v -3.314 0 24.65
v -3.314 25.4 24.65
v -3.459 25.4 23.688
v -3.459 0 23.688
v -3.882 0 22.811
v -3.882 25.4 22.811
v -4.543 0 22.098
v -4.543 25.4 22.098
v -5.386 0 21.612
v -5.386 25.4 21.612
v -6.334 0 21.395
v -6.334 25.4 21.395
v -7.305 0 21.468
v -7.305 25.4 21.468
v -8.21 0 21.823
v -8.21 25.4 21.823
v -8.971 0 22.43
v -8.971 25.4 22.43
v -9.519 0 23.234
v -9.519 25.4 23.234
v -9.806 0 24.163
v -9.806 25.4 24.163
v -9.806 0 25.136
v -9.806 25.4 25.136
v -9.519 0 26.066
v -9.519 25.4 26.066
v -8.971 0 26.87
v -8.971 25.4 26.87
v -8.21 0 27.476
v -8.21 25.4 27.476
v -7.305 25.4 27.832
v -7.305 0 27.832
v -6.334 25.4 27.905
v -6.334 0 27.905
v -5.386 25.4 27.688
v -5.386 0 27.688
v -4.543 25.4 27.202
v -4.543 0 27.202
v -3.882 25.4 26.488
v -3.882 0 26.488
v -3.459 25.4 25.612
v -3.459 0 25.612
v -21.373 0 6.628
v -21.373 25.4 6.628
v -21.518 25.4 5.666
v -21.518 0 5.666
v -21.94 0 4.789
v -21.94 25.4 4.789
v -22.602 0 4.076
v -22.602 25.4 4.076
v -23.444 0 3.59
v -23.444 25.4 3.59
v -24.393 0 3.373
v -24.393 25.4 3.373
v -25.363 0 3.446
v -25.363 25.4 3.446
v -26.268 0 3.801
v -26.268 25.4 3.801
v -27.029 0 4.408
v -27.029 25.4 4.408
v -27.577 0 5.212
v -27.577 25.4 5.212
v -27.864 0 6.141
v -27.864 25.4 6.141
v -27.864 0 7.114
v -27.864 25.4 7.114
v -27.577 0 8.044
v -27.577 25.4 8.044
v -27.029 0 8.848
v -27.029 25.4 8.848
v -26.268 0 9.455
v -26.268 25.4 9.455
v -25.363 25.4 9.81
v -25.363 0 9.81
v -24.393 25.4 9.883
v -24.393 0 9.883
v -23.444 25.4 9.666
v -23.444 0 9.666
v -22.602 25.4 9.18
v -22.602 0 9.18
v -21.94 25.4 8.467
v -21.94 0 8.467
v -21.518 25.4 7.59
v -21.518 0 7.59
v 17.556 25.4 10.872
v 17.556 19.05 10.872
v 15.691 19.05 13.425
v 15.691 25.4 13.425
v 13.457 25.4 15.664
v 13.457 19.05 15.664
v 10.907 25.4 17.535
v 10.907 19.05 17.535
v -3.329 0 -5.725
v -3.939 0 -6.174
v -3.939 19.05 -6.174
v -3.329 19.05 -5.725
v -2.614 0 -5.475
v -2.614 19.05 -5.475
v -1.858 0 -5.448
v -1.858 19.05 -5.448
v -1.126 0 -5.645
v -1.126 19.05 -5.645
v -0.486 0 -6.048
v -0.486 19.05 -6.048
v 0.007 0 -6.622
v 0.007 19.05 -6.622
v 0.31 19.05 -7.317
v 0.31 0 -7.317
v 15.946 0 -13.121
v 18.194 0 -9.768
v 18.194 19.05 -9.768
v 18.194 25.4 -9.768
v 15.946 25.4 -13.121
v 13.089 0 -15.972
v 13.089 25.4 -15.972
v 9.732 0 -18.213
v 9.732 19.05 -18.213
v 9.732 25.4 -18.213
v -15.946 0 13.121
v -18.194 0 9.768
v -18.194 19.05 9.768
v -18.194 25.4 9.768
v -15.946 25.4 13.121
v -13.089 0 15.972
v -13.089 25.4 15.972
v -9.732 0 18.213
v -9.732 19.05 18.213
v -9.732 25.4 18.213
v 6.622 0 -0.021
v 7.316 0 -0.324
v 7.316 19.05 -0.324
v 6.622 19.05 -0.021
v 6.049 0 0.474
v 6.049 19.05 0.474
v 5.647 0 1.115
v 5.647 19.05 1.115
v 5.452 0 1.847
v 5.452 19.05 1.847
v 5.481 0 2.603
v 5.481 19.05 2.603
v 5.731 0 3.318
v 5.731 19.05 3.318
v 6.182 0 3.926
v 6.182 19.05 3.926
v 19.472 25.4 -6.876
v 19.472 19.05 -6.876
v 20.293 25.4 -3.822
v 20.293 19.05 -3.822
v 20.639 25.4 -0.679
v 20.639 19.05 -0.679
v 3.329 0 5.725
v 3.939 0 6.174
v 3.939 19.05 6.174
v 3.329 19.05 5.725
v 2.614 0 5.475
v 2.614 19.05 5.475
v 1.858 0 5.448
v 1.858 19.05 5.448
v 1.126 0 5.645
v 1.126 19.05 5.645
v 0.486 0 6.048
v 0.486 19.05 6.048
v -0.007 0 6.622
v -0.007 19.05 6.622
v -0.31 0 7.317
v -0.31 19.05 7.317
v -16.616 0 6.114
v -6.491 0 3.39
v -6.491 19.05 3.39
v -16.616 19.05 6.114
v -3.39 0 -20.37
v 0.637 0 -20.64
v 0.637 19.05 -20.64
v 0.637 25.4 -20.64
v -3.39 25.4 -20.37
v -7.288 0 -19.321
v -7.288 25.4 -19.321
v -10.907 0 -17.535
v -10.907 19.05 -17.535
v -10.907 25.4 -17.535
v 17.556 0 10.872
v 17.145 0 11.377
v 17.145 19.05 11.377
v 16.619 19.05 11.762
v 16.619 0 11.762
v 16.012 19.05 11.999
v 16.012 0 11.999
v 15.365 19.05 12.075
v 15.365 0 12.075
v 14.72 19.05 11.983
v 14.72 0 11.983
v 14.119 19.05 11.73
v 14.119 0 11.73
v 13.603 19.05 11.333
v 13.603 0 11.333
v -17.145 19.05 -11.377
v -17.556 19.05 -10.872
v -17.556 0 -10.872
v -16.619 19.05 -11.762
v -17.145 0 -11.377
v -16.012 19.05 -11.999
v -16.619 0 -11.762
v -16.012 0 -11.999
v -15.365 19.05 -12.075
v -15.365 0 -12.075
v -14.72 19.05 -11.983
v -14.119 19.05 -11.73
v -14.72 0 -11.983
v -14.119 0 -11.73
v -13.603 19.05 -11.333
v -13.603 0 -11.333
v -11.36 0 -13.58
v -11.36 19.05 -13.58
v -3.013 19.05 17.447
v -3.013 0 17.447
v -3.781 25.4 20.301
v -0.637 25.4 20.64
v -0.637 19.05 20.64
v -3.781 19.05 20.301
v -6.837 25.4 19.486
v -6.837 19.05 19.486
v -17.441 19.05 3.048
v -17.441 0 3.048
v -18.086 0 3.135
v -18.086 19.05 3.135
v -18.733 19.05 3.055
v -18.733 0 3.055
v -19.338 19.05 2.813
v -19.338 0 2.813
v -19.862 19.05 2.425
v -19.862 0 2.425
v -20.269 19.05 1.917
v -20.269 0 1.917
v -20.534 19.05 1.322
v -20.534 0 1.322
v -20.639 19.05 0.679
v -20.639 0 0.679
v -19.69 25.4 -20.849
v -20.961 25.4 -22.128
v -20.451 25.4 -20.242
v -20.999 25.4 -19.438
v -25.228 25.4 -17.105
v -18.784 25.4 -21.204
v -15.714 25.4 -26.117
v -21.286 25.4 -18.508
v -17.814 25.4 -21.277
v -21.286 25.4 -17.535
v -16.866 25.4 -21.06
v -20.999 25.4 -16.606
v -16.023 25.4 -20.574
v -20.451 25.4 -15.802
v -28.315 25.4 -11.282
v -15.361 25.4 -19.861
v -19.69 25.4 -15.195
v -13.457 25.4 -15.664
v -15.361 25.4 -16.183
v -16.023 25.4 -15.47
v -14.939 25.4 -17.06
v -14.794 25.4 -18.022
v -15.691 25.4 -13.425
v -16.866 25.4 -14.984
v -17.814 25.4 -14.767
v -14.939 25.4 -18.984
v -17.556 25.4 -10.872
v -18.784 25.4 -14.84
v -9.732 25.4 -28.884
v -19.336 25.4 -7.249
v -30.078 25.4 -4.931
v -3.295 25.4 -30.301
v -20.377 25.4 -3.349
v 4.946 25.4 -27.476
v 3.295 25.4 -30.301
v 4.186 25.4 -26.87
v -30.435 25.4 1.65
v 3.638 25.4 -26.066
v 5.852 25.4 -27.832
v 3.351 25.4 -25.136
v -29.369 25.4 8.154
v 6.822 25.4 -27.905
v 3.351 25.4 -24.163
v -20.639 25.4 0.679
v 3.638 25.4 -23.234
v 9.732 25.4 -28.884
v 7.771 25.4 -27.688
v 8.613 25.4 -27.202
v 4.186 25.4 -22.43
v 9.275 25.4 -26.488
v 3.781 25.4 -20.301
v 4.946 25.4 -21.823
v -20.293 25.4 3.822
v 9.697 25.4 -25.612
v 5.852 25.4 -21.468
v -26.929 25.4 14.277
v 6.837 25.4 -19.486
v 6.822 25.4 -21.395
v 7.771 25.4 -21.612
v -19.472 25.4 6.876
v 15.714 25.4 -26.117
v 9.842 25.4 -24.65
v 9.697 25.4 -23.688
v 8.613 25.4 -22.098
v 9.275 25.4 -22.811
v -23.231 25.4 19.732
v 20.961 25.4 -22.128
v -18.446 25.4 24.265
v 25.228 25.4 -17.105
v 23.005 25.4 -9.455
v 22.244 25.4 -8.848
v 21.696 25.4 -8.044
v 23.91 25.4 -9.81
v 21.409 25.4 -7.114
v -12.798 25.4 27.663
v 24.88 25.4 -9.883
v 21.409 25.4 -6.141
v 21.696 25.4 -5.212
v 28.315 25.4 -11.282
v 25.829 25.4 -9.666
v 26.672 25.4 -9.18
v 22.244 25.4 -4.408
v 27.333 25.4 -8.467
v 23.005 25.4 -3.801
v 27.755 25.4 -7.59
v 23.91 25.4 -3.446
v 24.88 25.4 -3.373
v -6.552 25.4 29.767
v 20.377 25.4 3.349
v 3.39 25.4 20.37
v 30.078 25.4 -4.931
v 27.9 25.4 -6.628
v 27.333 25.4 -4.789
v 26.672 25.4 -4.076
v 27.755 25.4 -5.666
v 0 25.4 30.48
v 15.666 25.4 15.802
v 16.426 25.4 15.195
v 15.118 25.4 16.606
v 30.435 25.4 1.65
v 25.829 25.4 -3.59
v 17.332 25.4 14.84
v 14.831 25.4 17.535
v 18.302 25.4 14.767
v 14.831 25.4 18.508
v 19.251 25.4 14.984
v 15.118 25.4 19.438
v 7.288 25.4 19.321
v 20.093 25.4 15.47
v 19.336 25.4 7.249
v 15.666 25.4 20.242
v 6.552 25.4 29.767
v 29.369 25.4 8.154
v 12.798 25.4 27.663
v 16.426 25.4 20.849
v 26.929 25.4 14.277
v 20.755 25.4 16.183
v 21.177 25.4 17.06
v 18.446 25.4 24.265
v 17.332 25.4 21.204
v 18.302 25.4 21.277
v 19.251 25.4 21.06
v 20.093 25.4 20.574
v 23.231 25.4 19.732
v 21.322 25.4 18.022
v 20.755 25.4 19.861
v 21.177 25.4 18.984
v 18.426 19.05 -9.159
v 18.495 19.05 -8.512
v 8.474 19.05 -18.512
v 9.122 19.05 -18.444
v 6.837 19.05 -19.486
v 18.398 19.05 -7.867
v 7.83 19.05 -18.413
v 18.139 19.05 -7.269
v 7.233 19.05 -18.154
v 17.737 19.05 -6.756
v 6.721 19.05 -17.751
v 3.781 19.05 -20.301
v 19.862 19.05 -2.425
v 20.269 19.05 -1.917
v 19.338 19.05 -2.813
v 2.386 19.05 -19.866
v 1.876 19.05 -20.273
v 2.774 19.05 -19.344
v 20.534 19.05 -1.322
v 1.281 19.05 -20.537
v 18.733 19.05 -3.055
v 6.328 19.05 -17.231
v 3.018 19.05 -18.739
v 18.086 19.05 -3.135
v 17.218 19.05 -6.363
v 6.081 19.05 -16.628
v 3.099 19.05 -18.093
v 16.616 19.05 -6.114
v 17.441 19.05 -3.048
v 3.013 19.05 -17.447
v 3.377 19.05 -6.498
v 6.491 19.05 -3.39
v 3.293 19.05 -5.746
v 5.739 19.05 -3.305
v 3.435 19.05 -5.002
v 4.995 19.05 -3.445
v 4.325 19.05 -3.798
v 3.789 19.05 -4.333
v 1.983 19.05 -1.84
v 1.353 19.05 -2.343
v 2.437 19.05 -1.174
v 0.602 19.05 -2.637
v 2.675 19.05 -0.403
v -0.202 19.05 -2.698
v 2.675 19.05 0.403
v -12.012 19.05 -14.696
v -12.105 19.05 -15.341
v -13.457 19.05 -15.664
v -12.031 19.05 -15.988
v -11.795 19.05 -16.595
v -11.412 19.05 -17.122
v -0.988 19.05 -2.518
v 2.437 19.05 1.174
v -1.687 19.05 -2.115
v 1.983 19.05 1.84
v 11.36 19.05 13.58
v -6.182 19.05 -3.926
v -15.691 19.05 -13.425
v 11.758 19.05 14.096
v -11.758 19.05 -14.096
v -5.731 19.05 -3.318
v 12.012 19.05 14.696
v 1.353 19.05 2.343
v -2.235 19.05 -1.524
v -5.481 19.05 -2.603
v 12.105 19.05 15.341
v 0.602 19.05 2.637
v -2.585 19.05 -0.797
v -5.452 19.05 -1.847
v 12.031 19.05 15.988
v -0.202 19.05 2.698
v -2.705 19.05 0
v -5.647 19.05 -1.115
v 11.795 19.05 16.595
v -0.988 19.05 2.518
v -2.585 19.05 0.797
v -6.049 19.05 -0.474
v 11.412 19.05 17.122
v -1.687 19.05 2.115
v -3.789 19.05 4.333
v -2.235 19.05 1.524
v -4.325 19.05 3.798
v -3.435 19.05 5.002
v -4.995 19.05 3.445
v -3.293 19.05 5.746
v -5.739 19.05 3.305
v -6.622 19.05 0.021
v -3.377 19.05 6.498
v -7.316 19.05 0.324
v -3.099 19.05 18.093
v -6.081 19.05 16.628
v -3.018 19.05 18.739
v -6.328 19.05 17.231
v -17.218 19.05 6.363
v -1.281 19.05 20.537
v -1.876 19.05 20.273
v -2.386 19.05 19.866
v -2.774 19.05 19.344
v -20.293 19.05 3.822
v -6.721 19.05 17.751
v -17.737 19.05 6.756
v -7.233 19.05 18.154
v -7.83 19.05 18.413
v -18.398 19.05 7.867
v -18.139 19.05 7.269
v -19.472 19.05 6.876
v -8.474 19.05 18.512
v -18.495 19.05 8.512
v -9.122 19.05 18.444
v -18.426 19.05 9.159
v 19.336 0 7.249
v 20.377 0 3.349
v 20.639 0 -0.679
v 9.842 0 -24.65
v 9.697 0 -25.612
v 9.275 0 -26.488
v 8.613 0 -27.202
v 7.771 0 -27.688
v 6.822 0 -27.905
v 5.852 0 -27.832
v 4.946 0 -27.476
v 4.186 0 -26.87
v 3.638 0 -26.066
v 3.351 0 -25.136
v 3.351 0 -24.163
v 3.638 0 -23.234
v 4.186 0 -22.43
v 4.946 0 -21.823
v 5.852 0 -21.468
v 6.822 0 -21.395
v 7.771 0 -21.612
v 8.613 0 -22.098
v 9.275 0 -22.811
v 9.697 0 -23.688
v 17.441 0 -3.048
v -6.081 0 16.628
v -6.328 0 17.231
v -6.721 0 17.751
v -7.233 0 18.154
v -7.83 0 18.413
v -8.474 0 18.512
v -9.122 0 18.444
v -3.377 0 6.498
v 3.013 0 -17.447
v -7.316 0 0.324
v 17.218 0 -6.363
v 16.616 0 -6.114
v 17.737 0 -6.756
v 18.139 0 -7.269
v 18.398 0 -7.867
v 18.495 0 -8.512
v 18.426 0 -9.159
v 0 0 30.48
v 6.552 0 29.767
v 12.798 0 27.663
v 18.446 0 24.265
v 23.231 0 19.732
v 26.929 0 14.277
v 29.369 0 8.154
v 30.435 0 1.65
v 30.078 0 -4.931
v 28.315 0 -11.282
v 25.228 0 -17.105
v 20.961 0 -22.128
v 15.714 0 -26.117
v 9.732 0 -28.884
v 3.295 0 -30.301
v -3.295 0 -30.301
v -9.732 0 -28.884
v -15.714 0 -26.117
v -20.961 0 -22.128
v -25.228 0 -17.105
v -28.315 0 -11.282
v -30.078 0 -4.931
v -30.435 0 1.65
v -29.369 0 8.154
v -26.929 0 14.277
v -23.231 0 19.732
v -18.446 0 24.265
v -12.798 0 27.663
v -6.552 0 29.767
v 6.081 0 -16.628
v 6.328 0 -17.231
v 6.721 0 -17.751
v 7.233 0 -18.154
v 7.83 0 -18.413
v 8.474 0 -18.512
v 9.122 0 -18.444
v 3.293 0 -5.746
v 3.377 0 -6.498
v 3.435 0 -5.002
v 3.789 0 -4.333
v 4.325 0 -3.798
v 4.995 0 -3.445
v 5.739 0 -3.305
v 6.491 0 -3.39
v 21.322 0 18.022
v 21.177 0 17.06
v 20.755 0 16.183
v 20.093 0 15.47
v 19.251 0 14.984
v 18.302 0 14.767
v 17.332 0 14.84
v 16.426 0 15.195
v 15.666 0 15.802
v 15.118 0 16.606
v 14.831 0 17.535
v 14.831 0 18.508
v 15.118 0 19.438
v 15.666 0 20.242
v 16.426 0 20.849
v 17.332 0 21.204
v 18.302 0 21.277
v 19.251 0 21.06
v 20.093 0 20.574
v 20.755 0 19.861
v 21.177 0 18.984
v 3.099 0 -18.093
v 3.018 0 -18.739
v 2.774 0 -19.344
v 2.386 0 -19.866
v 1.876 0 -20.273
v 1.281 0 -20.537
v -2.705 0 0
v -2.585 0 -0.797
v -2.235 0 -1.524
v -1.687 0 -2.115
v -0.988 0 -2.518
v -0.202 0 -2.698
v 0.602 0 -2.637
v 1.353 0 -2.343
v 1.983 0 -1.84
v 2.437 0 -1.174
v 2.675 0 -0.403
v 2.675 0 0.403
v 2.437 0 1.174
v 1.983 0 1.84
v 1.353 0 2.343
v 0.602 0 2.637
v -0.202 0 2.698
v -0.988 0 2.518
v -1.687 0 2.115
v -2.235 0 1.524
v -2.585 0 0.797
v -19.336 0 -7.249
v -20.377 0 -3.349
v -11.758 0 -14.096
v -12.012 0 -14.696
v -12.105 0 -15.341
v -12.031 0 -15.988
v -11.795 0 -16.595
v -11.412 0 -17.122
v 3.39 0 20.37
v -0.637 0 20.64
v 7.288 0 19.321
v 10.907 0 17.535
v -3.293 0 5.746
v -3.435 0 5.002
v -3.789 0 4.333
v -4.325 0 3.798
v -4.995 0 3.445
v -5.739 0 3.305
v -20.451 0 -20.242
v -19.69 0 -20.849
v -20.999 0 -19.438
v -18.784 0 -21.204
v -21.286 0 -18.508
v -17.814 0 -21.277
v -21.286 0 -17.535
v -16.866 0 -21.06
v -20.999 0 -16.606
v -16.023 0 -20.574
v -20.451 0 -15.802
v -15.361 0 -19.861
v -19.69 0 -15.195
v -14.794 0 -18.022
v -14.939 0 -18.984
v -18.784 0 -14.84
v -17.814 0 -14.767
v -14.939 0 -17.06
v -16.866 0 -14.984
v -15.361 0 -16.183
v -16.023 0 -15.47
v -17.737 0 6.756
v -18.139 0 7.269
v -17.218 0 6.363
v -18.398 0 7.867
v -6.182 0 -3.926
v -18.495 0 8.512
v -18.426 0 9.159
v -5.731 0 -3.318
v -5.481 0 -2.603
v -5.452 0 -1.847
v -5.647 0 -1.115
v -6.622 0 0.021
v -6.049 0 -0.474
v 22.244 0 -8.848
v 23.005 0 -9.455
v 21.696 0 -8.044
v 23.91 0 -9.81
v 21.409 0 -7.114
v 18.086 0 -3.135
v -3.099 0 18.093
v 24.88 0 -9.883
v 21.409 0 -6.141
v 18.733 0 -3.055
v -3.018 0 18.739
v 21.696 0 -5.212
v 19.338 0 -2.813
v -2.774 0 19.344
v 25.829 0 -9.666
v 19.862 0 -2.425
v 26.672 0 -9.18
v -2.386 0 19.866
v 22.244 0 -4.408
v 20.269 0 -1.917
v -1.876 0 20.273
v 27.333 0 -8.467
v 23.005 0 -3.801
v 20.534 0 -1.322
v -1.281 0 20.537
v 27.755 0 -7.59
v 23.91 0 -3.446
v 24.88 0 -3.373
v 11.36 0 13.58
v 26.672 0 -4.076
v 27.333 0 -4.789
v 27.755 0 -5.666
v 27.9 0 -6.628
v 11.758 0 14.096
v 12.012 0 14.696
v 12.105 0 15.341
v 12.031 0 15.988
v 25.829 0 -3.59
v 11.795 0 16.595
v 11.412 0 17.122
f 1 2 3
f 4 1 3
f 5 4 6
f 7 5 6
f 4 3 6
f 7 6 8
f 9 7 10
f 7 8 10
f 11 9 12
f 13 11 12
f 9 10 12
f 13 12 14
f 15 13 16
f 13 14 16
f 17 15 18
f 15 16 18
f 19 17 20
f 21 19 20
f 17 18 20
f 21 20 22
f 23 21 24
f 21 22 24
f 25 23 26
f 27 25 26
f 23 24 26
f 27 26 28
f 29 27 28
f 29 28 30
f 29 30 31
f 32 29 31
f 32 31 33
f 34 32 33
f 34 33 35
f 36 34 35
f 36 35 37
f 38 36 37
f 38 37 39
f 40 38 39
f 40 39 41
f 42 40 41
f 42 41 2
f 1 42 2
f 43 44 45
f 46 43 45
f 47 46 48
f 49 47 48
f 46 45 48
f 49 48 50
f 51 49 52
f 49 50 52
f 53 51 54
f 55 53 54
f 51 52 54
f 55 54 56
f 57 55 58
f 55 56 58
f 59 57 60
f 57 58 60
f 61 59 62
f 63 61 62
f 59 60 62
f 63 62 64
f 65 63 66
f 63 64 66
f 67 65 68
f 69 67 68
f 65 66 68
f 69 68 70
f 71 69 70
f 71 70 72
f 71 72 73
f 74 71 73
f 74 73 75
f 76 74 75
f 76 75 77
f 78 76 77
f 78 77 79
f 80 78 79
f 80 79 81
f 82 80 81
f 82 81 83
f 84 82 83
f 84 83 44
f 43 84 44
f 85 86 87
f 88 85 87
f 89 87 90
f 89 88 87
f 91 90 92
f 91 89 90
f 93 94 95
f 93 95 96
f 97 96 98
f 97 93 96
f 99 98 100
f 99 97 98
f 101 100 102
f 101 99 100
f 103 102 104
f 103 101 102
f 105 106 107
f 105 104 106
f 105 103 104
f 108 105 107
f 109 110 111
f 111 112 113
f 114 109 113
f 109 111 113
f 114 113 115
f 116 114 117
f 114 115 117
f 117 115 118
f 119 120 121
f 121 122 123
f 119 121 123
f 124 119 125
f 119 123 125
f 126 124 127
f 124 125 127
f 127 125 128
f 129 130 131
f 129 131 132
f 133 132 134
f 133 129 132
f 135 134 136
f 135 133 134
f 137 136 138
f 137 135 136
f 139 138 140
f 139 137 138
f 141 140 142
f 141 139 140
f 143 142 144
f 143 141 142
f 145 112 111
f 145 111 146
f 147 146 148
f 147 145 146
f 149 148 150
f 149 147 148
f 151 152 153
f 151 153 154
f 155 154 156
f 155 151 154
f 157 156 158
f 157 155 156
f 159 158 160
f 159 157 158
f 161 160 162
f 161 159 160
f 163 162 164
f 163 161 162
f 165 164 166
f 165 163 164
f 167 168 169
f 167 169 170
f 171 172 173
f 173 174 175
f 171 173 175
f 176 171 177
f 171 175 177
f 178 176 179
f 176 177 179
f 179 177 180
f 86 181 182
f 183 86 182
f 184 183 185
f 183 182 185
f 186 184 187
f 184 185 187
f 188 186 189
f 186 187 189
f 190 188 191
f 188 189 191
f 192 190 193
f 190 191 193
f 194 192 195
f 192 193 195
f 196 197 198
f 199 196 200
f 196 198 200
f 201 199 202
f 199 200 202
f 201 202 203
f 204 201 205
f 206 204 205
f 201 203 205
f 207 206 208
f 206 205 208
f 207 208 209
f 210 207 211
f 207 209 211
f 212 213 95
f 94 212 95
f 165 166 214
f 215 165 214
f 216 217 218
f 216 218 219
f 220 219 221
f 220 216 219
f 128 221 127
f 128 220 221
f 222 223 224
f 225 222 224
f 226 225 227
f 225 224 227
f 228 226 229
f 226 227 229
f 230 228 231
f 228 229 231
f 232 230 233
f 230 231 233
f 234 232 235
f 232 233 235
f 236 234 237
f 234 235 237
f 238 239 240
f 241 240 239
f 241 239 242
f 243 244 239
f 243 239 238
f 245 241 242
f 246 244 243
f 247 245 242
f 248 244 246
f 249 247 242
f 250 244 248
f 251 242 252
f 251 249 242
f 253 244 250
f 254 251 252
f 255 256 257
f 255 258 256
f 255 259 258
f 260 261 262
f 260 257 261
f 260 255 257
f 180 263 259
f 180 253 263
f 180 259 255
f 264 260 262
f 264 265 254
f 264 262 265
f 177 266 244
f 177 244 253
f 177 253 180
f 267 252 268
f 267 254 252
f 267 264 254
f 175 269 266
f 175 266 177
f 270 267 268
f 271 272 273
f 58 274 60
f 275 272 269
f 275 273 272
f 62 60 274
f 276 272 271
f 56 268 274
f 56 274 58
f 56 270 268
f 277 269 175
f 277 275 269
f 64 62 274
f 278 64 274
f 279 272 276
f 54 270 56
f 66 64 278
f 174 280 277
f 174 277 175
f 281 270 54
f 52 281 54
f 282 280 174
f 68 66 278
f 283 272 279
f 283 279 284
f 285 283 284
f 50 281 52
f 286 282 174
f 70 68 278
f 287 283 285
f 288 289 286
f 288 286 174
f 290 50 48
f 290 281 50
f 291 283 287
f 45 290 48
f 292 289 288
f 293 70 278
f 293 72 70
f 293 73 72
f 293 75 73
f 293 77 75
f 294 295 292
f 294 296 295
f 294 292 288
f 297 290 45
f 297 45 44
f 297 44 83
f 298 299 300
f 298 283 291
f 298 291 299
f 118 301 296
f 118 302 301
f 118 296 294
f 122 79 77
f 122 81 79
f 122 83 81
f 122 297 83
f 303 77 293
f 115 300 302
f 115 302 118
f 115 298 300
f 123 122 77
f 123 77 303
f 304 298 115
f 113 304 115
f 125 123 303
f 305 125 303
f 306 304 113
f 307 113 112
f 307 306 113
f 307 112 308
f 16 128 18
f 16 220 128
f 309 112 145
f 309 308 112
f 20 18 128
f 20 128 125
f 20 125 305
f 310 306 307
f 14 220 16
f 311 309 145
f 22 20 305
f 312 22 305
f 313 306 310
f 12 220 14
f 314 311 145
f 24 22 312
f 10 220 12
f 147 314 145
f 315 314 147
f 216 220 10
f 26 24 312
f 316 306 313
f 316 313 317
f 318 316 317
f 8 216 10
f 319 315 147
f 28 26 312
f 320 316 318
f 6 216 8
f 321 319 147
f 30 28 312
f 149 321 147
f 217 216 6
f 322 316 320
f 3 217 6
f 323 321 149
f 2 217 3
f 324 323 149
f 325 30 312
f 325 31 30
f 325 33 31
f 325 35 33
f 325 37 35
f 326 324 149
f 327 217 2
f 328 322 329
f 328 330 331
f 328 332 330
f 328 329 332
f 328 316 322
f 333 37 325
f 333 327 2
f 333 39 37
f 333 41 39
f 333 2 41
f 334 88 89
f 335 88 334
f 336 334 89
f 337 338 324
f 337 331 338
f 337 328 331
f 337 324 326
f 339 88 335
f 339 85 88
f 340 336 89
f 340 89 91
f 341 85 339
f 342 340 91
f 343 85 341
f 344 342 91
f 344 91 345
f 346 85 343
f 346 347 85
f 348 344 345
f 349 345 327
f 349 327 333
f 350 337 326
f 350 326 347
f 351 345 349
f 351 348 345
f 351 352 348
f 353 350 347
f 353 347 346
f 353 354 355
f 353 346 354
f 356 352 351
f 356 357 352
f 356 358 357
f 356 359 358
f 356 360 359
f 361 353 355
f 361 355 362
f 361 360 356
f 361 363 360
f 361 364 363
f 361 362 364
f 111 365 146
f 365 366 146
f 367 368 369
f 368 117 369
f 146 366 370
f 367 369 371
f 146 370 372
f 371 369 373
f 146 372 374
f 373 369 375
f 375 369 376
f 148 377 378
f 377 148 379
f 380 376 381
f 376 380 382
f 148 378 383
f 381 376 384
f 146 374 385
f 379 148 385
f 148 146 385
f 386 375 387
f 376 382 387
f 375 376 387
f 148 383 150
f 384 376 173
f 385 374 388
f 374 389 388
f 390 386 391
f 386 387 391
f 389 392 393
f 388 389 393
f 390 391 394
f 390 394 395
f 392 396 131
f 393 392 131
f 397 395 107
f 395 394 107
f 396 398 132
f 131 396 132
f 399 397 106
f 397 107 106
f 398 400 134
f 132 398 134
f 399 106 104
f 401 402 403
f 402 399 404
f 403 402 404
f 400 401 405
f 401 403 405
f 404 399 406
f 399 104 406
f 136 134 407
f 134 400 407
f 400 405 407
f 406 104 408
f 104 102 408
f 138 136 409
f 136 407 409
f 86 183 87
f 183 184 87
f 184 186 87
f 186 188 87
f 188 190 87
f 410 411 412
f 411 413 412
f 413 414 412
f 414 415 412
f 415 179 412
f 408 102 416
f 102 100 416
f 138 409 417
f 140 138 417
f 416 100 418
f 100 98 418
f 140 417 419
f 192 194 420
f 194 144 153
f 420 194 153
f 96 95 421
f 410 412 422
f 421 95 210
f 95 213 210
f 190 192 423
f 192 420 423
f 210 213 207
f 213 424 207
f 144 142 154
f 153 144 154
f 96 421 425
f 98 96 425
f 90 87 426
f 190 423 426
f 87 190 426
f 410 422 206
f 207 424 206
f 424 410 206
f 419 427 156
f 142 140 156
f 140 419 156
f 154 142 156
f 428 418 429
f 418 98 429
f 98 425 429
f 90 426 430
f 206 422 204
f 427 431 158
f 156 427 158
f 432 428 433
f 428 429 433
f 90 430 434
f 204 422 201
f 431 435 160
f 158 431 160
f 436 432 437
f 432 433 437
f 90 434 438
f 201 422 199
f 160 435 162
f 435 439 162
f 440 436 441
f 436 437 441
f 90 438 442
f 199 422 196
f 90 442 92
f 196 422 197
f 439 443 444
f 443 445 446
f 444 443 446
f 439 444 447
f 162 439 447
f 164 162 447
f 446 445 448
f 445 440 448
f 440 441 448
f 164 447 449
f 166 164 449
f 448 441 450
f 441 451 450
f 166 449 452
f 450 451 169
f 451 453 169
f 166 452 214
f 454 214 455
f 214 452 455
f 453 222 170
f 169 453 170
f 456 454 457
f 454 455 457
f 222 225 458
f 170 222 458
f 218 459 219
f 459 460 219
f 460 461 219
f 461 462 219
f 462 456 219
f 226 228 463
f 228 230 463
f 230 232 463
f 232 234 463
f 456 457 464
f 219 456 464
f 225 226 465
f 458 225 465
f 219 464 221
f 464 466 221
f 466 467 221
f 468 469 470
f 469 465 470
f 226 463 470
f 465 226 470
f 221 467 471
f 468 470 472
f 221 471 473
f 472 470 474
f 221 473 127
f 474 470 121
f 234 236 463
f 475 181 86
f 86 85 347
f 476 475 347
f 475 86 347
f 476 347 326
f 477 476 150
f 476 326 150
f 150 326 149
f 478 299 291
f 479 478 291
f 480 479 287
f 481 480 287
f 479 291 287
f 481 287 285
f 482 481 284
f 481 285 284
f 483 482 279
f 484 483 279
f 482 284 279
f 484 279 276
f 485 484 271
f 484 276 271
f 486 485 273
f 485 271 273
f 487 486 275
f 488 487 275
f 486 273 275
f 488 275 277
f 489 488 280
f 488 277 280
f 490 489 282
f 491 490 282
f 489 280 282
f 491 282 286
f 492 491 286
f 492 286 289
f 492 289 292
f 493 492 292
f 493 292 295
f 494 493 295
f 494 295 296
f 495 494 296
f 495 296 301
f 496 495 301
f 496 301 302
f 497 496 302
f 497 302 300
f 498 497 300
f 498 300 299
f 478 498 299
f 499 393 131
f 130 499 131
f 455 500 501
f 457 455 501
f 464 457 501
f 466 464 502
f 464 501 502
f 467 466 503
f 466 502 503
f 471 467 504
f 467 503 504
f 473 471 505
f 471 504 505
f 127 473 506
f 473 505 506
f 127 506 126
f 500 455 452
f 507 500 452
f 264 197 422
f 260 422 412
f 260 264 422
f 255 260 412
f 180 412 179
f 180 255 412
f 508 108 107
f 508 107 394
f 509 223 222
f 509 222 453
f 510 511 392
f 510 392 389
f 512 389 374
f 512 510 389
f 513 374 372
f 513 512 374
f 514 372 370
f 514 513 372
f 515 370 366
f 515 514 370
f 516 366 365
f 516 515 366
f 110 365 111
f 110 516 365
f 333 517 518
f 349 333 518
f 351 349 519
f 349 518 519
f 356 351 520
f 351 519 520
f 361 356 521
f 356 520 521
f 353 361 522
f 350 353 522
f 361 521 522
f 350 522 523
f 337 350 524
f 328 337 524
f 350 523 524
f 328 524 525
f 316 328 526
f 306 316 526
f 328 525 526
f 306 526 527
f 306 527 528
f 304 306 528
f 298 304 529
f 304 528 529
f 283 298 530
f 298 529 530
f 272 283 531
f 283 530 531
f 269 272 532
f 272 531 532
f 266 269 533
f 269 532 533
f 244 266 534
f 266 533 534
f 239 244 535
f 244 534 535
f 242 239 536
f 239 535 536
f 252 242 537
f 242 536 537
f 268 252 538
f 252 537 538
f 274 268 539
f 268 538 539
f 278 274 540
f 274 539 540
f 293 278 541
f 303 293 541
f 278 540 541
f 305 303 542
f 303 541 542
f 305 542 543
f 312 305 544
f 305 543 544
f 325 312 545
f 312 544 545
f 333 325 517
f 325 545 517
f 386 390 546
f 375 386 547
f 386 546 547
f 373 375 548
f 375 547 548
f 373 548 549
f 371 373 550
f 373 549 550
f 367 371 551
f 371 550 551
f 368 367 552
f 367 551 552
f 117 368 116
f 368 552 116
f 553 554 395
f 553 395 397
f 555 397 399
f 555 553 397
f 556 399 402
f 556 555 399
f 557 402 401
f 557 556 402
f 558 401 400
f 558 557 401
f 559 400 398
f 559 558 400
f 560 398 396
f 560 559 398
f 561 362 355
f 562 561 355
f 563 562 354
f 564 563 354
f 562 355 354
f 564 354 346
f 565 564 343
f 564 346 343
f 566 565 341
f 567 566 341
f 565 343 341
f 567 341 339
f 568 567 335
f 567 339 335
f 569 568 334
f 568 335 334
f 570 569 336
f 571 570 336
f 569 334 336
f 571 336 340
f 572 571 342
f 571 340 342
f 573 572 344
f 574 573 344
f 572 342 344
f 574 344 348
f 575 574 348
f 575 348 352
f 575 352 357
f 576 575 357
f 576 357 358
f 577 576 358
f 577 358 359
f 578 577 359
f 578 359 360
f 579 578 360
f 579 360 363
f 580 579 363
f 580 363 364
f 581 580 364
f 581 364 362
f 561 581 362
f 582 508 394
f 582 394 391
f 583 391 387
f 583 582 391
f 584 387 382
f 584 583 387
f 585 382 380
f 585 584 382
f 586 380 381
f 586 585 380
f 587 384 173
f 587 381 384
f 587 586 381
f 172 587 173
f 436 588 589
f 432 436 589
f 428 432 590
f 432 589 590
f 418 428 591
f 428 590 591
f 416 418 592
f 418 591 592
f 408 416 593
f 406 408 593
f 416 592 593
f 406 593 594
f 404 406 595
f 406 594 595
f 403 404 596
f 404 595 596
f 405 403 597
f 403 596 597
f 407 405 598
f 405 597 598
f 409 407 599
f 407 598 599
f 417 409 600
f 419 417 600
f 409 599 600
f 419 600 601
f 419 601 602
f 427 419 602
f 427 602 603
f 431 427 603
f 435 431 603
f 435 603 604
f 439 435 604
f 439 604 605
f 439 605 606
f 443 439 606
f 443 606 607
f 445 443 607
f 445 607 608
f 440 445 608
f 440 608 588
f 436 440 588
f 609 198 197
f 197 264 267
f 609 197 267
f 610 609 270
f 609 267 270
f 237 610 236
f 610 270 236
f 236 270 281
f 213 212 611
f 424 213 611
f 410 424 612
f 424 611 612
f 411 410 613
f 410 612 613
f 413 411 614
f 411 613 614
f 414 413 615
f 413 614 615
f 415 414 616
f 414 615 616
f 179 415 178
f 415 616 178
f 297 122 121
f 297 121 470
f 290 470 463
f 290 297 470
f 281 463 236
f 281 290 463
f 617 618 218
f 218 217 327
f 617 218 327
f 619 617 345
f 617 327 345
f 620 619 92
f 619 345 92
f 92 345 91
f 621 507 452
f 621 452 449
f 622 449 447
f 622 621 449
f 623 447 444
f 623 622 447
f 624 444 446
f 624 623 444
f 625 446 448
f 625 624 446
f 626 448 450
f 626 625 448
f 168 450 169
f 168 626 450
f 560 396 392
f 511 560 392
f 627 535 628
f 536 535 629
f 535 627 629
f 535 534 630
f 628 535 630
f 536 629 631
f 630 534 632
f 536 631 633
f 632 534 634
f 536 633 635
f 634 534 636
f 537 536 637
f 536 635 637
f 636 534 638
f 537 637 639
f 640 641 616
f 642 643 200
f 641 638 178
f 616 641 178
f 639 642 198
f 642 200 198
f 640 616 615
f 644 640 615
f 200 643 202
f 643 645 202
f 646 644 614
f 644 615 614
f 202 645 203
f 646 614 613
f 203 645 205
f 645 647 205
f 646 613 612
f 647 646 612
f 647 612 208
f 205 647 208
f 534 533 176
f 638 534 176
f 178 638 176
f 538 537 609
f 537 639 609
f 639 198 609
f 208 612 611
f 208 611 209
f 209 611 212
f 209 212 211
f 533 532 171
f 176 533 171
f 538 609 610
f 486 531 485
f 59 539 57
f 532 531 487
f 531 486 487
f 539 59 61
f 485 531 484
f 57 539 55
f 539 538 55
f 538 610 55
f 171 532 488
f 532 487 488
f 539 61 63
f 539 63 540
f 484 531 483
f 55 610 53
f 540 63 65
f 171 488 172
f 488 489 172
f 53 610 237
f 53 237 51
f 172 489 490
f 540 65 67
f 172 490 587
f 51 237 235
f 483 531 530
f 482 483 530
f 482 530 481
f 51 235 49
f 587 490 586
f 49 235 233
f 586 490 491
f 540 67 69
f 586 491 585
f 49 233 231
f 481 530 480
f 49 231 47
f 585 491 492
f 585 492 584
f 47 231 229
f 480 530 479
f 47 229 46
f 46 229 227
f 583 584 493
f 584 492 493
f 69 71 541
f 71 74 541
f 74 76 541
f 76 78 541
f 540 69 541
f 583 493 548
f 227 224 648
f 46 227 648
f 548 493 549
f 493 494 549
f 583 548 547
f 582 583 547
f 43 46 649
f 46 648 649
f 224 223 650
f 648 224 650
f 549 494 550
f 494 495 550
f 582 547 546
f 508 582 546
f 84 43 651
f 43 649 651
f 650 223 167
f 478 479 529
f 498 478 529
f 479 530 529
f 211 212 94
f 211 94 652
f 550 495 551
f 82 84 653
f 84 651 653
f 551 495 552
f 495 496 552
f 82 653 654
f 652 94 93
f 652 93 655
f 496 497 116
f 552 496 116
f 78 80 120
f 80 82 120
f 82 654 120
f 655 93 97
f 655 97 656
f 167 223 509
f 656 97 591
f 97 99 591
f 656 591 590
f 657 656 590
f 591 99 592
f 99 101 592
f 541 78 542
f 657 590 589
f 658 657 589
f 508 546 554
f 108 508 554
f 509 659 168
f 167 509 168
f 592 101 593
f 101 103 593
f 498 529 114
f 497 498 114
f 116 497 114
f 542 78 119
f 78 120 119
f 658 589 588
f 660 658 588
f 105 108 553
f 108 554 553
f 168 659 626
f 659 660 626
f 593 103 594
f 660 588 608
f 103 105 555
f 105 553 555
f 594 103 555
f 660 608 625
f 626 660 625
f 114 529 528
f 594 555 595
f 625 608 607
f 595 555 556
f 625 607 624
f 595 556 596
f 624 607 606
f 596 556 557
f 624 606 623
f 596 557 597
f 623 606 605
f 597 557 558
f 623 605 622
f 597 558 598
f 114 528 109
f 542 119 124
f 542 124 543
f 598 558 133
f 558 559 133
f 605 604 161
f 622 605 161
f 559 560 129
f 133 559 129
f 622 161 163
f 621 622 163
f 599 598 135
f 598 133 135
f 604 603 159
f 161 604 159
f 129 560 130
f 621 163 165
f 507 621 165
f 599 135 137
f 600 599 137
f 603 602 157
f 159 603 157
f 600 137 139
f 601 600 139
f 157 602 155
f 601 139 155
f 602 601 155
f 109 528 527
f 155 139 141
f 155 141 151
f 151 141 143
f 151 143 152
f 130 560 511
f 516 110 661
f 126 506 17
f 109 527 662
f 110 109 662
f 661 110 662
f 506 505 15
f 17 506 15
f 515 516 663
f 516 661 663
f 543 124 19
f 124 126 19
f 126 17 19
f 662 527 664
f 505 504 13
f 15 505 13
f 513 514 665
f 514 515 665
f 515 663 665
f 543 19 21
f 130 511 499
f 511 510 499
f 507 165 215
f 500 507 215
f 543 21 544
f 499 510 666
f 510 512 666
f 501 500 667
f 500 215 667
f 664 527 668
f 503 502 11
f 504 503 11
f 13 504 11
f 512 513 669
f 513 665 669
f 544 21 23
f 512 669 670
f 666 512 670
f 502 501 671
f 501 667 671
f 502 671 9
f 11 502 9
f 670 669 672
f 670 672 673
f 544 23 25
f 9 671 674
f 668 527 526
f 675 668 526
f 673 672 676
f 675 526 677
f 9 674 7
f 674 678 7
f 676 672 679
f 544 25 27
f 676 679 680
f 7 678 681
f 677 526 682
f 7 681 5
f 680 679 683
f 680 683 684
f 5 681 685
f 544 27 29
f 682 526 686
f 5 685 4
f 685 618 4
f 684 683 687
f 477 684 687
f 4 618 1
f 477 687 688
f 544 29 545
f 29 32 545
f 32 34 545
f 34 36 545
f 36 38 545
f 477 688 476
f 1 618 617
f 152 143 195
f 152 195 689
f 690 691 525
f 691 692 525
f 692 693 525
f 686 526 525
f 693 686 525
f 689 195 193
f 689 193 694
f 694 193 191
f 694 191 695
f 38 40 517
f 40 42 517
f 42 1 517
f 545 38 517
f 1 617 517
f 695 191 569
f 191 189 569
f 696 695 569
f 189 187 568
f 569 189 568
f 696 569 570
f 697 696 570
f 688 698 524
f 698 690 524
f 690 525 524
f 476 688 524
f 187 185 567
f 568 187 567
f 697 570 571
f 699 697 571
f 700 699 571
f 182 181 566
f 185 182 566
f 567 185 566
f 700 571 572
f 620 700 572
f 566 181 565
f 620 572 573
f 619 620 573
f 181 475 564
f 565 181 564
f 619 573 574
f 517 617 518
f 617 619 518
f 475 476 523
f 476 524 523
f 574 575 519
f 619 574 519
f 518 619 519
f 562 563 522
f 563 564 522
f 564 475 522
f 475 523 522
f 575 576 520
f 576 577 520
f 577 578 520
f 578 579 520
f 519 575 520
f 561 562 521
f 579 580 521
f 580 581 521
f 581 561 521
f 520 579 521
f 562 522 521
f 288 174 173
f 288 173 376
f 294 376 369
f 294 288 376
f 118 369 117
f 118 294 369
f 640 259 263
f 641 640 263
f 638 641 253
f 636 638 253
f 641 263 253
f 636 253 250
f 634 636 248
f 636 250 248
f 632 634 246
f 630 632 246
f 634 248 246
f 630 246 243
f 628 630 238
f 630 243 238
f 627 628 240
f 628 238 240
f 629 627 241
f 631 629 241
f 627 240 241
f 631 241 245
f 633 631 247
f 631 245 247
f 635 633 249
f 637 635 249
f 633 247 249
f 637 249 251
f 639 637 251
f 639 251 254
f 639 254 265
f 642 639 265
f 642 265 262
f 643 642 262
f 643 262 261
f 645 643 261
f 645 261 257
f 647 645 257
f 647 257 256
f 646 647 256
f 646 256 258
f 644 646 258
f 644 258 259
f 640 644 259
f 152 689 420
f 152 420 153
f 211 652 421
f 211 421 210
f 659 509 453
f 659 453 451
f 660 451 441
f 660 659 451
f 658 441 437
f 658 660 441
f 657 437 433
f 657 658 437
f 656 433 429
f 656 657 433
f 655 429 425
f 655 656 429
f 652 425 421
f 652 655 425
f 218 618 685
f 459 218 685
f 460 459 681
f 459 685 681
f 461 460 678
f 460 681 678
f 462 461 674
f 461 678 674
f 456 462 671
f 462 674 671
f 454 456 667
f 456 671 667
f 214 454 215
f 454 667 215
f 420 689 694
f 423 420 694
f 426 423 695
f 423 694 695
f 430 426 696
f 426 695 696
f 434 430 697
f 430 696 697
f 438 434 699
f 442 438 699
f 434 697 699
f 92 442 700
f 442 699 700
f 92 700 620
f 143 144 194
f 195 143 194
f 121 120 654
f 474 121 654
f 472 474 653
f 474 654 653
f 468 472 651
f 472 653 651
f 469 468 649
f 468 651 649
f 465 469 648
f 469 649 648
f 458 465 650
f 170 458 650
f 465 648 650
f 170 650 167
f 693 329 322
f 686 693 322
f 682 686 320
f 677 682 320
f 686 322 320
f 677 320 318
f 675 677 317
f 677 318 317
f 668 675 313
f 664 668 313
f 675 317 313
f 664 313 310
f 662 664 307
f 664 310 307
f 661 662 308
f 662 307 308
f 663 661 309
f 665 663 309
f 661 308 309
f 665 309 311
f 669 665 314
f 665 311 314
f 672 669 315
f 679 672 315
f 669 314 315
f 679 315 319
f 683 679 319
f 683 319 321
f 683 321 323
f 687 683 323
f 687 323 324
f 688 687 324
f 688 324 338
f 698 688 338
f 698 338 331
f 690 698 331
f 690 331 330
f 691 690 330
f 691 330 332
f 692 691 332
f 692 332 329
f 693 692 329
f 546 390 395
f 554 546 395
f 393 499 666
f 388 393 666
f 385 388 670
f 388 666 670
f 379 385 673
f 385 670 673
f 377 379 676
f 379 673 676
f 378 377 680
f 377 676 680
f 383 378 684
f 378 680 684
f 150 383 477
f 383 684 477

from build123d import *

# Parameters (mm, degrees)
SKETCH1_R                = 30.48
BOSS_EXTRUDE1_DEPTH      = 25.4
F_1_4_28_TAPPED_HOLE1_D  = 5.4102
F_1_4_CLEARANCE_HOLE2_D  = 6.5278
CUT_EXTRUDE1_DEPTH       = 51.032197633
FILLET1_R                = 2.54
CIRPATTERN1_COUNT        = 6
FILLET1_OF_CIRPATTERN1_R = 2.54
SKETCH8_R                = 20.6502
CUT_EXTRUDE2_DEPTH       = 6.35


with BuildPart() as part:
    # Sketch1 → Boss-Extrude1 (new body)
    with BuildSketch(Plane(origin=(0, 0, 0), x_dir=(1, 0, 0), z_dir=(0, 1, 0))):
        with Locations(Location((0, 0, 0), (0, 0, 270))):
            Circle(SKETCH1_R)
    extrude(amount=BOSS_EXTRUDE1_DEPTH)

    # 1/4-28 Tapped Hole1 (through all)
    with Locations(Plane(origin=(0, 25.4, 0), x_dir=(1, 0, 0), z_dir=(0, 1, 0))):
        with Locations((0, 0)):
            Hole(F_1_4_28_TAPPED_HOLE1_D / 2)

    # 1/4 Clearance Hole2 (through all)
    with Locations(Plane(origin=(0, 0, 0), x_dir=(-1, 0, 0), z_dir=(0, -1, 0))):
        with Locations((269.174368783, -128.772908827), (-18.058184892, -18.021920393), (6.578348439, -24.649807059), (-24.636533331, 6.627886666), (-6.578348439, 24.649807059), (18.058184892, 18.021920393), (24.636533331, -6.627886666)):
            Hole(F_1_4_CLEARANCE_HOLE2_D / 2)

    # Sketch7 → Cut-Extrude1 (cut, through all)
    with BuildSketch(Plane(origin=(0, 25.4, 0), x_dir=(1, 0, 0), z_dir=(0, 1, 0))):
        with BuildLine():
            Line((-13.451907307, 15.667704039), (-0.82483254, 3.065987))
            Line((-0.82483254, 3.065987), (3.775037164, 20.302213043))
            ThreePointArc((3.775037164, 20.302213043), (-5.364710837, 19.941179445), (-13.451907307, 15.667704039))
        make_face()
    cut_extrude1 = extrude(amount=-CUT_EXTRUDE1_DEPTH, mode=Mode.SUBTRACT)

    # Fillet1
    fillet1_edges = [part.edges().sort_by_distance(p)[0] for p in [
        (-13.451907307, 12.7, -15.667704039),
        (3.775037164, 12.7, -20.302213043),
        (-0.82483254, 12.7, -3.065987),
    ]]
    fillet(fillet1_edges, radius=FILLET1_R)

    # CirPattern1: Cut-Extrude1 ×6 about axis
    cirpattern1_axis = Axis((0, 0, 0), (0, 1, 0))
    for i in range(1, CIRPATTERN1_COUNT):
        add(cut_extrude1.rotate(cirpattern1_axis, i * 360 / CIRPATTERN1_COUNT), mode=Mode.SUBTRACT)

    # Fillet1 of CirPattern1
    fillet1_of_cirpattern1_edges = [part.edges().sort_by_distance(p)[0] for p in [
        (-20.29458337, 12.7, 3.815841438),
        (-15.694713666, 12.7, -13.420384606),
        (-3.067638899, 12.7, -0.818667567),
        (-6.842676063, 12.7, 19.483545477),
        (-19.46975083, 12.7, 6.881828437),
        (-2.24280636, 12.7, 2.247319433),
        (13.451907307, 12.7, 15.667704039),
        (-3.775037164, 12.7, 20.302213043),
        (0.82483254, 12.7, 3.065987),
        (20.29458337, 12.7, -3.815841438),
        (15.694713666, 12.7, 13.420384606),
        (3.067638899, 12.7, 0.818667567),
        (6.842676063, 12.7, -19.483545477),
        (19.46975083, 12.7, -6.881828437),
        (2.24280636, 12.7, -2.247319433),
    ]]
    fillet(fillet1_of_cirpattern1_edges, radius=FILLET1_OF_CIRPATTERN1_R)

    # Sketch8 → Cut-Extrude2 (cut)
    with BuildSketch(Plane.XZ.offset(-25.4)):
        with Locations(Location((0, 0, 0), (0, 0, 90))):
            Circle(SKETCH8_R)
    extrude(amount=CUT_EXTRUDE2_DEPTH, mode=Mode.SUBTRACT)


solid = part.part
